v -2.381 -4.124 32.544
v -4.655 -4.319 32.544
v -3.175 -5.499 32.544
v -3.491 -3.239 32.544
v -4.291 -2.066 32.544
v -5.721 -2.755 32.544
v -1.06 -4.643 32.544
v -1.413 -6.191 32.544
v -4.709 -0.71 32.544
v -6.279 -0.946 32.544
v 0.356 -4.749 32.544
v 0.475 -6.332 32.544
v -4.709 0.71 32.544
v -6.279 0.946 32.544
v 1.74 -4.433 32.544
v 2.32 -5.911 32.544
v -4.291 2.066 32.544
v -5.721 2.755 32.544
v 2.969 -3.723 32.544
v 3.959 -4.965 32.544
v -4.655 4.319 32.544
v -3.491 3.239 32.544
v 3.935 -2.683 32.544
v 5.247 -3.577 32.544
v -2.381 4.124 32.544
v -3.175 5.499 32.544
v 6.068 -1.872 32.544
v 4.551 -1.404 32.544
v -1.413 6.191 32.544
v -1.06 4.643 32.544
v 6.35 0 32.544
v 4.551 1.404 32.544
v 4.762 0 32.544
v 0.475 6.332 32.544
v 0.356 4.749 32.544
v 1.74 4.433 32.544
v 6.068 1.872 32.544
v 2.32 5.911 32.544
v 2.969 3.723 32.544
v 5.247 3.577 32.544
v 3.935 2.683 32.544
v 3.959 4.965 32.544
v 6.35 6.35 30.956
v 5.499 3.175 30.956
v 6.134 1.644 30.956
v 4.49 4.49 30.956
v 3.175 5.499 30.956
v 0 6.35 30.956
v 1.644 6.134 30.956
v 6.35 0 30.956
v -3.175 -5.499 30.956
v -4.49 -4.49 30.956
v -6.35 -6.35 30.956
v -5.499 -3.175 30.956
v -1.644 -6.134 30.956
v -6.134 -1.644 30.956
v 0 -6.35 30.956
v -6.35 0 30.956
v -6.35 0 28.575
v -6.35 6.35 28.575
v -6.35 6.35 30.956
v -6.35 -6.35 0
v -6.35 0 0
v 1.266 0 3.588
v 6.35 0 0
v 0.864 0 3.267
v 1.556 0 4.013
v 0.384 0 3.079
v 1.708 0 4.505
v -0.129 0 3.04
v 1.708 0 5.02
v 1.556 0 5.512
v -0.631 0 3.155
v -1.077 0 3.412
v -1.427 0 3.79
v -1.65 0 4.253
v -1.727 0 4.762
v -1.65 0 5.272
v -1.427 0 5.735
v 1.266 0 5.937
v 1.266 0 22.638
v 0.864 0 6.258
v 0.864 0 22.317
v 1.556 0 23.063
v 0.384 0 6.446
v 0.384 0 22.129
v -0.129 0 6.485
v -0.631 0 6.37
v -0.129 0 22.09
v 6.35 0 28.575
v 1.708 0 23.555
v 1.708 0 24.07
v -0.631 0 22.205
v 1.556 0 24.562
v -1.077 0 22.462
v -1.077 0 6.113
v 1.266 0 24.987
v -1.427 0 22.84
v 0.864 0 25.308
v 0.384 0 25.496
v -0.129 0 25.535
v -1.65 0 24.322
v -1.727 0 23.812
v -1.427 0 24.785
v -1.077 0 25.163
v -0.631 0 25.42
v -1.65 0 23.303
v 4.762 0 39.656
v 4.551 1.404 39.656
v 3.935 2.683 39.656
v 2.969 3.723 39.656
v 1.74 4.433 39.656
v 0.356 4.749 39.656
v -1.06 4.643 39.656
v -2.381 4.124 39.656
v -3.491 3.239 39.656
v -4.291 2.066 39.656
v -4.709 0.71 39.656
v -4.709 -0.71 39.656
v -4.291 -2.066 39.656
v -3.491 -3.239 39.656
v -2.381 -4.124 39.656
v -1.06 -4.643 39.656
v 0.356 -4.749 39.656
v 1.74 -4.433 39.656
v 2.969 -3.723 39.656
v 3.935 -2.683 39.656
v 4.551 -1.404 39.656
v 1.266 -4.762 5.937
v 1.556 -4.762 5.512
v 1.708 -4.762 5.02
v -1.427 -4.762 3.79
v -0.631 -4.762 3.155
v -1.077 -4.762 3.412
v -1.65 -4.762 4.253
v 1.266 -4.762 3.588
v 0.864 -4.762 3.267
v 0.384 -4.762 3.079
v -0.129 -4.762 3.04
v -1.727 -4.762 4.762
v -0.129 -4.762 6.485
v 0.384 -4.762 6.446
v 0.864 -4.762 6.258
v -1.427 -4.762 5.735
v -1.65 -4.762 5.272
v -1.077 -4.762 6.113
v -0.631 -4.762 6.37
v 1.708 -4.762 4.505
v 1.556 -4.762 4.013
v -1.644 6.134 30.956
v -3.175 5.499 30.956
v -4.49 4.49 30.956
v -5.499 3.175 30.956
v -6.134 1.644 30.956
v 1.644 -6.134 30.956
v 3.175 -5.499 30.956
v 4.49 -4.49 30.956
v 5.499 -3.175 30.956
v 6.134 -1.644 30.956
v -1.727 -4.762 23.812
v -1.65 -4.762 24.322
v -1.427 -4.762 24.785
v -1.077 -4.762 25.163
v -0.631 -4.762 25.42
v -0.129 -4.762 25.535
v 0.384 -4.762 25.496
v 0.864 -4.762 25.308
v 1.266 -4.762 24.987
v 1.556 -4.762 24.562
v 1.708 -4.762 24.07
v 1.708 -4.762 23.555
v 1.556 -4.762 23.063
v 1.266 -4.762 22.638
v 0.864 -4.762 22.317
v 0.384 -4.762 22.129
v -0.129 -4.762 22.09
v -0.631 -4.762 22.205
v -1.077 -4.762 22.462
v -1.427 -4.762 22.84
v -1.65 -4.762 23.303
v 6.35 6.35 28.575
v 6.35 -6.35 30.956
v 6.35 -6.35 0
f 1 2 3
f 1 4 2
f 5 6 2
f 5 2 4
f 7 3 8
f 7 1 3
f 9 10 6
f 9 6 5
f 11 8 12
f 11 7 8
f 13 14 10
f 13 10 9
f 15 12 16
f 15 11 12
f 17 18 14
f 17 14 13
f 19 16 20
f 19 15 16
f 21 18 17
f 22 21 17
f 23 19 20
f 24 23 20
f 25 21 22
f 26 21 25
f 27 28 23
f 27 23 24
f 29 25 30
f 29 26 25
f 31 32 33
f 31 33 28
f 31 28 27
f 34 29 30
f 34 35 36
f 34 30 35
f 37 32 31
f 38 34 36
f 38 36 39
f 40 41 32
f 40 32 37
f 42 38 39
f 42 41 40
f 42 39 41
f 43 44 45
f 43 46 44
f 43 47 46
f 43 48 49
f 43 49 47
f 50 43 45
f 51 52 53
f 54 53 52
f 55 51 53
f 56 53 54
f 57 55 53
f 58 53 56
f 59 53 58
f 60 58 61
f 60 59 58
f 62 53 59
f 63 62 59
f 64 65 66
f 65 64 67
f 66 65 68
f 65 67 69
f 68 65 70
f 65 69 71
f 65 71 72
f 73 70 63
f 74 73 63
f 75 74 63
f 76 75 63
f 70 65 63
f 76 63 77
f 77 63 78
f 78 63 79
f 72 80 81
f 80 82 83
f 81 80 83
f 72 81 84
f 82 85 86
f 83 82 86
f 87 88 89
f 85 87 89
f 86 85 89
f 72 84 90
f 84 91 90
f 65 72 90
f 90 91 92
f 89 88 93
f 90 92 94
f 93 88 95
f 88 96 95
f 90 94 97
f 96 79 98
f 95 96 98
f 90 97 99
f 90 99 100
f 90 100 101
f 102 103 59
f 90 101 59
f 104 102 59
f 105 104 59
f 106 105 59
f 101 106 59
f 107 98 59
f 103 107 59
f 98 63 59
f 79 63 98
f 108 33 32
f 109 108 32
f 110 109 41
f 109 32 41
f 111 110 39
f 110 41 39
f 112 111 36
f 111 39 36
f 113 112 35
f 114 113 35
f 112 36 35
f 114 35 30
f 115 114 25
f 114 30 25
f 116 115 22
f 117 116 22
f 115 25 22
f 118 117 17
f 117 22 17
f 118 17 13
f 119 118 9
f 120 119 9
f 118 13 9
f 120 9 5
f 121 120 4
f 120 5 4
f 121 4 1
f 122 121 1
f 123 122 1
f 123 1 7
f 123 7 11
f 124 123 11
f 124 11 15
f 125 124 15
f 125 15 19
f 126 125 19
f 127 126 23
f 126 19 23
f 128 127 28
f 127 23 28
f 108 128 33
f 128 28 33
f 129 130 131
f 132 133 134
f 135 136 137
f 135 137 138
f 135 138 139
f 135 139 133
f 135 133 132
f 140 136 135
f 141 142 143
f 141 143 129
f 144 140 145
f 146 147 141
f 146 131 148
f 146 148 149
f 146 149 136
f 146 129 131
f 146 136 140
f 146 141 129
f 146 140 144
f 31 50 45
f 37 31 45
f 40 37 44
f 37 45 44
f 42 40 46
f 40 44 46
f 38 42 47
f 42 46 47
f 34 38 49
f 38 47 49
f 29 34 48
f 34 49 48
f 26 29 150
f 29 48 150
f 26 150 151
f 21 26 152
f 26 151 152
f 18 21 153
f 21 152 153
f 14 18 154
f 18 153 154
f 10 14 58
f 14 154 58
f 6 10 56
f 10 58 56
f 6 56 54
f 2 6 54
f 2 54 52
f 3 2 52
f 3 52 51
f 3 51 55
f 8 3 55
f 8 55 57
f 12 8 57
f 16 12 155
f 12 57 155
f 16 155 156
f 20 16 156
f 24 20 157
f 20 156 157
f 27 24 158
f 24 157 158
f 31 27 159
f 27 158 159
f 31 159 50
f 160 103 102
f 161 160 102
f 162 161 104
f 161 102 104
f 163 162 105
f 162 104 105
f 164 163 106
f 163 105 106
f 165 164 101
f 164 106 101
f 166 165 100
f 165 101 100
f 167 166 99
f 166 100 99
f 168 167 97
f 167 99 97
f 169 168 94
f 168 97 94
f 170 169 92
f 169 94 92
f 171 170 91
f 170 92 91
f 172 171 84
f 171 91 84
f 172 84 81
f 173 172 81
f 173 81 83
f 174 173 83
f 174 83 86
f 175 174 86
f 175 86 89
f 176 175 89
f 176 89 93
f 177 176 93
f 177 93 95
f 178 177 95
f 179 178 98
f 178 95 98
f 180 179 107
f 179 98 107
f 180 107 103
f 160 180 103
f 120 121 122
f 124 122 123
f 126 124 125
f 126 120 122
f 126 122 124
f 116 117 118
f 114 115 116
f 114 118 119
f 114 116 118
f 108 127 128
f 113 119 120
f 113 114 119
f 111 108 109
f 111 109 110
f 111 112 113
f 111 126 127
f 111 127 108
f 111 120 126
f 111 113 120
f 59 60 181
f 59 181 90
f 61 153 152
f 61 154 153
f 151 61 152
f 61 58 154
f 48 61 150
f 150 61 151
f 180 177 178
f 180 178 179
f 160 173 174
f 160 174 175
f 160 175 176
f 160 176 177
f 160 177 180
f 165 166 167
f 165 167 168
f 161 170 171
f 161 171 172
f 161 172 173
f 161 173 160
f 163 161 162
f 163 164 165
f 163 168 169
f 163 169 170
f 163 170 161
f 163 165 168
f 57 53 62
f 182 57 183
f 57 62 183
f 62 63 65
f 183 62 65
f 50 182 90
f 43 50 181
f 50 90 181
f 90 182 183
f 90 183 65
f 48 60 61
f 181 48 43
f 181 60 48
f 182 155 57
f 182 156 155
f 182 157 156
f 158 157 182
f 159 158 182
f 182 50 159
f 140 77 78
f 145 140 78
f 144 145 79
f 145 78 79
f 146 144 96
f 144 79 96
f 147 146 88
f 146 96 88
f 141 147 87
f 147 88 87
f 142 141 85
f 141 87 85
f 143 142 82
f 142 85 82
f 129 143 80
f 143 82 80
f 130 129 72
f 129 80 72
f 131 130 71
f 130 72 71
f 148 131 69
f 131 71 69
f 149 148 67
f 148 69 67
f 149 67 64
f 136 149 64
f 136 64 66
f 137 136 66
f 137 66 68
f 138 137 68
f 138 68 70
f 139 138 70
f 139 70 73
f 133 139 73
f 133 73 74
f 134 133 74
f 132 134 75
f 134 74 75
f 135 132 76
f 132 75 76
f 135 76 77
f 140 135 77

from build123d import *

# Parameters (mm, degrees)
F0_W     = 12.7
F0_H     = 12.7
F1_DEPTH = 30.95625
F2_R     = 6.35
F3_DEPTH = 1.5875
F4_R     = 4.7625
F5_DEPTH = 7.112
F6_W     = 6.35
F6_H     = 28.575
F7_DEPTH = 12.7
F8_R     = 1.7272
F9_DEPTH = 4.7625


with BuildPart() as f1:
    # F0 (on Top) → F1 (new body)
    with BuildSketch(Plane.XY):
        Rectangle(F0_W, F0_H)
    extrude(amount=F1_DEPTH)

    # F2 (on face) → F3 (join)
    with BuildSketch(Plane.XY.offset(30.95625)):
        Circle(F2_R)
    extrude(amount=F3_DEPTH)

    # F4 (on face) → F5 (join)
    with BuildSketch(Plane.XY.offset(32.54375)):
        Circle(F4_R)
    extrude(amount=F5_DEPTH)

    # F6 (on face) → F7 (cut, through all)
    with BuildSketch(Plane(origin=(-6.35, 0, 0), x_dir=(0, -1, 0), z_dir=(-1, 0, 0))):
        with Locations((-3.175, 14.2875)):
            Rectangle(F6_W, F6_H)
    extrude(amount=-F7_DEPTH, mode=Mode.SUBTRACT)

    # F8 (on face) → F9 (cut)
    with BuildSketch(Plane(origin=(0, 0, 0), x_dir=(-1, 0, 0), z_dir=(0, 1, 0))):
        with Locations((0, 23.8125)):
            Circle(F8_R)
        with Locations((0, 4.7625)):
            Circle(F8_R)
    extrude(amount=-F9_DEPTH, mode=Mode.SUBTRACT)


solid = f1.part
